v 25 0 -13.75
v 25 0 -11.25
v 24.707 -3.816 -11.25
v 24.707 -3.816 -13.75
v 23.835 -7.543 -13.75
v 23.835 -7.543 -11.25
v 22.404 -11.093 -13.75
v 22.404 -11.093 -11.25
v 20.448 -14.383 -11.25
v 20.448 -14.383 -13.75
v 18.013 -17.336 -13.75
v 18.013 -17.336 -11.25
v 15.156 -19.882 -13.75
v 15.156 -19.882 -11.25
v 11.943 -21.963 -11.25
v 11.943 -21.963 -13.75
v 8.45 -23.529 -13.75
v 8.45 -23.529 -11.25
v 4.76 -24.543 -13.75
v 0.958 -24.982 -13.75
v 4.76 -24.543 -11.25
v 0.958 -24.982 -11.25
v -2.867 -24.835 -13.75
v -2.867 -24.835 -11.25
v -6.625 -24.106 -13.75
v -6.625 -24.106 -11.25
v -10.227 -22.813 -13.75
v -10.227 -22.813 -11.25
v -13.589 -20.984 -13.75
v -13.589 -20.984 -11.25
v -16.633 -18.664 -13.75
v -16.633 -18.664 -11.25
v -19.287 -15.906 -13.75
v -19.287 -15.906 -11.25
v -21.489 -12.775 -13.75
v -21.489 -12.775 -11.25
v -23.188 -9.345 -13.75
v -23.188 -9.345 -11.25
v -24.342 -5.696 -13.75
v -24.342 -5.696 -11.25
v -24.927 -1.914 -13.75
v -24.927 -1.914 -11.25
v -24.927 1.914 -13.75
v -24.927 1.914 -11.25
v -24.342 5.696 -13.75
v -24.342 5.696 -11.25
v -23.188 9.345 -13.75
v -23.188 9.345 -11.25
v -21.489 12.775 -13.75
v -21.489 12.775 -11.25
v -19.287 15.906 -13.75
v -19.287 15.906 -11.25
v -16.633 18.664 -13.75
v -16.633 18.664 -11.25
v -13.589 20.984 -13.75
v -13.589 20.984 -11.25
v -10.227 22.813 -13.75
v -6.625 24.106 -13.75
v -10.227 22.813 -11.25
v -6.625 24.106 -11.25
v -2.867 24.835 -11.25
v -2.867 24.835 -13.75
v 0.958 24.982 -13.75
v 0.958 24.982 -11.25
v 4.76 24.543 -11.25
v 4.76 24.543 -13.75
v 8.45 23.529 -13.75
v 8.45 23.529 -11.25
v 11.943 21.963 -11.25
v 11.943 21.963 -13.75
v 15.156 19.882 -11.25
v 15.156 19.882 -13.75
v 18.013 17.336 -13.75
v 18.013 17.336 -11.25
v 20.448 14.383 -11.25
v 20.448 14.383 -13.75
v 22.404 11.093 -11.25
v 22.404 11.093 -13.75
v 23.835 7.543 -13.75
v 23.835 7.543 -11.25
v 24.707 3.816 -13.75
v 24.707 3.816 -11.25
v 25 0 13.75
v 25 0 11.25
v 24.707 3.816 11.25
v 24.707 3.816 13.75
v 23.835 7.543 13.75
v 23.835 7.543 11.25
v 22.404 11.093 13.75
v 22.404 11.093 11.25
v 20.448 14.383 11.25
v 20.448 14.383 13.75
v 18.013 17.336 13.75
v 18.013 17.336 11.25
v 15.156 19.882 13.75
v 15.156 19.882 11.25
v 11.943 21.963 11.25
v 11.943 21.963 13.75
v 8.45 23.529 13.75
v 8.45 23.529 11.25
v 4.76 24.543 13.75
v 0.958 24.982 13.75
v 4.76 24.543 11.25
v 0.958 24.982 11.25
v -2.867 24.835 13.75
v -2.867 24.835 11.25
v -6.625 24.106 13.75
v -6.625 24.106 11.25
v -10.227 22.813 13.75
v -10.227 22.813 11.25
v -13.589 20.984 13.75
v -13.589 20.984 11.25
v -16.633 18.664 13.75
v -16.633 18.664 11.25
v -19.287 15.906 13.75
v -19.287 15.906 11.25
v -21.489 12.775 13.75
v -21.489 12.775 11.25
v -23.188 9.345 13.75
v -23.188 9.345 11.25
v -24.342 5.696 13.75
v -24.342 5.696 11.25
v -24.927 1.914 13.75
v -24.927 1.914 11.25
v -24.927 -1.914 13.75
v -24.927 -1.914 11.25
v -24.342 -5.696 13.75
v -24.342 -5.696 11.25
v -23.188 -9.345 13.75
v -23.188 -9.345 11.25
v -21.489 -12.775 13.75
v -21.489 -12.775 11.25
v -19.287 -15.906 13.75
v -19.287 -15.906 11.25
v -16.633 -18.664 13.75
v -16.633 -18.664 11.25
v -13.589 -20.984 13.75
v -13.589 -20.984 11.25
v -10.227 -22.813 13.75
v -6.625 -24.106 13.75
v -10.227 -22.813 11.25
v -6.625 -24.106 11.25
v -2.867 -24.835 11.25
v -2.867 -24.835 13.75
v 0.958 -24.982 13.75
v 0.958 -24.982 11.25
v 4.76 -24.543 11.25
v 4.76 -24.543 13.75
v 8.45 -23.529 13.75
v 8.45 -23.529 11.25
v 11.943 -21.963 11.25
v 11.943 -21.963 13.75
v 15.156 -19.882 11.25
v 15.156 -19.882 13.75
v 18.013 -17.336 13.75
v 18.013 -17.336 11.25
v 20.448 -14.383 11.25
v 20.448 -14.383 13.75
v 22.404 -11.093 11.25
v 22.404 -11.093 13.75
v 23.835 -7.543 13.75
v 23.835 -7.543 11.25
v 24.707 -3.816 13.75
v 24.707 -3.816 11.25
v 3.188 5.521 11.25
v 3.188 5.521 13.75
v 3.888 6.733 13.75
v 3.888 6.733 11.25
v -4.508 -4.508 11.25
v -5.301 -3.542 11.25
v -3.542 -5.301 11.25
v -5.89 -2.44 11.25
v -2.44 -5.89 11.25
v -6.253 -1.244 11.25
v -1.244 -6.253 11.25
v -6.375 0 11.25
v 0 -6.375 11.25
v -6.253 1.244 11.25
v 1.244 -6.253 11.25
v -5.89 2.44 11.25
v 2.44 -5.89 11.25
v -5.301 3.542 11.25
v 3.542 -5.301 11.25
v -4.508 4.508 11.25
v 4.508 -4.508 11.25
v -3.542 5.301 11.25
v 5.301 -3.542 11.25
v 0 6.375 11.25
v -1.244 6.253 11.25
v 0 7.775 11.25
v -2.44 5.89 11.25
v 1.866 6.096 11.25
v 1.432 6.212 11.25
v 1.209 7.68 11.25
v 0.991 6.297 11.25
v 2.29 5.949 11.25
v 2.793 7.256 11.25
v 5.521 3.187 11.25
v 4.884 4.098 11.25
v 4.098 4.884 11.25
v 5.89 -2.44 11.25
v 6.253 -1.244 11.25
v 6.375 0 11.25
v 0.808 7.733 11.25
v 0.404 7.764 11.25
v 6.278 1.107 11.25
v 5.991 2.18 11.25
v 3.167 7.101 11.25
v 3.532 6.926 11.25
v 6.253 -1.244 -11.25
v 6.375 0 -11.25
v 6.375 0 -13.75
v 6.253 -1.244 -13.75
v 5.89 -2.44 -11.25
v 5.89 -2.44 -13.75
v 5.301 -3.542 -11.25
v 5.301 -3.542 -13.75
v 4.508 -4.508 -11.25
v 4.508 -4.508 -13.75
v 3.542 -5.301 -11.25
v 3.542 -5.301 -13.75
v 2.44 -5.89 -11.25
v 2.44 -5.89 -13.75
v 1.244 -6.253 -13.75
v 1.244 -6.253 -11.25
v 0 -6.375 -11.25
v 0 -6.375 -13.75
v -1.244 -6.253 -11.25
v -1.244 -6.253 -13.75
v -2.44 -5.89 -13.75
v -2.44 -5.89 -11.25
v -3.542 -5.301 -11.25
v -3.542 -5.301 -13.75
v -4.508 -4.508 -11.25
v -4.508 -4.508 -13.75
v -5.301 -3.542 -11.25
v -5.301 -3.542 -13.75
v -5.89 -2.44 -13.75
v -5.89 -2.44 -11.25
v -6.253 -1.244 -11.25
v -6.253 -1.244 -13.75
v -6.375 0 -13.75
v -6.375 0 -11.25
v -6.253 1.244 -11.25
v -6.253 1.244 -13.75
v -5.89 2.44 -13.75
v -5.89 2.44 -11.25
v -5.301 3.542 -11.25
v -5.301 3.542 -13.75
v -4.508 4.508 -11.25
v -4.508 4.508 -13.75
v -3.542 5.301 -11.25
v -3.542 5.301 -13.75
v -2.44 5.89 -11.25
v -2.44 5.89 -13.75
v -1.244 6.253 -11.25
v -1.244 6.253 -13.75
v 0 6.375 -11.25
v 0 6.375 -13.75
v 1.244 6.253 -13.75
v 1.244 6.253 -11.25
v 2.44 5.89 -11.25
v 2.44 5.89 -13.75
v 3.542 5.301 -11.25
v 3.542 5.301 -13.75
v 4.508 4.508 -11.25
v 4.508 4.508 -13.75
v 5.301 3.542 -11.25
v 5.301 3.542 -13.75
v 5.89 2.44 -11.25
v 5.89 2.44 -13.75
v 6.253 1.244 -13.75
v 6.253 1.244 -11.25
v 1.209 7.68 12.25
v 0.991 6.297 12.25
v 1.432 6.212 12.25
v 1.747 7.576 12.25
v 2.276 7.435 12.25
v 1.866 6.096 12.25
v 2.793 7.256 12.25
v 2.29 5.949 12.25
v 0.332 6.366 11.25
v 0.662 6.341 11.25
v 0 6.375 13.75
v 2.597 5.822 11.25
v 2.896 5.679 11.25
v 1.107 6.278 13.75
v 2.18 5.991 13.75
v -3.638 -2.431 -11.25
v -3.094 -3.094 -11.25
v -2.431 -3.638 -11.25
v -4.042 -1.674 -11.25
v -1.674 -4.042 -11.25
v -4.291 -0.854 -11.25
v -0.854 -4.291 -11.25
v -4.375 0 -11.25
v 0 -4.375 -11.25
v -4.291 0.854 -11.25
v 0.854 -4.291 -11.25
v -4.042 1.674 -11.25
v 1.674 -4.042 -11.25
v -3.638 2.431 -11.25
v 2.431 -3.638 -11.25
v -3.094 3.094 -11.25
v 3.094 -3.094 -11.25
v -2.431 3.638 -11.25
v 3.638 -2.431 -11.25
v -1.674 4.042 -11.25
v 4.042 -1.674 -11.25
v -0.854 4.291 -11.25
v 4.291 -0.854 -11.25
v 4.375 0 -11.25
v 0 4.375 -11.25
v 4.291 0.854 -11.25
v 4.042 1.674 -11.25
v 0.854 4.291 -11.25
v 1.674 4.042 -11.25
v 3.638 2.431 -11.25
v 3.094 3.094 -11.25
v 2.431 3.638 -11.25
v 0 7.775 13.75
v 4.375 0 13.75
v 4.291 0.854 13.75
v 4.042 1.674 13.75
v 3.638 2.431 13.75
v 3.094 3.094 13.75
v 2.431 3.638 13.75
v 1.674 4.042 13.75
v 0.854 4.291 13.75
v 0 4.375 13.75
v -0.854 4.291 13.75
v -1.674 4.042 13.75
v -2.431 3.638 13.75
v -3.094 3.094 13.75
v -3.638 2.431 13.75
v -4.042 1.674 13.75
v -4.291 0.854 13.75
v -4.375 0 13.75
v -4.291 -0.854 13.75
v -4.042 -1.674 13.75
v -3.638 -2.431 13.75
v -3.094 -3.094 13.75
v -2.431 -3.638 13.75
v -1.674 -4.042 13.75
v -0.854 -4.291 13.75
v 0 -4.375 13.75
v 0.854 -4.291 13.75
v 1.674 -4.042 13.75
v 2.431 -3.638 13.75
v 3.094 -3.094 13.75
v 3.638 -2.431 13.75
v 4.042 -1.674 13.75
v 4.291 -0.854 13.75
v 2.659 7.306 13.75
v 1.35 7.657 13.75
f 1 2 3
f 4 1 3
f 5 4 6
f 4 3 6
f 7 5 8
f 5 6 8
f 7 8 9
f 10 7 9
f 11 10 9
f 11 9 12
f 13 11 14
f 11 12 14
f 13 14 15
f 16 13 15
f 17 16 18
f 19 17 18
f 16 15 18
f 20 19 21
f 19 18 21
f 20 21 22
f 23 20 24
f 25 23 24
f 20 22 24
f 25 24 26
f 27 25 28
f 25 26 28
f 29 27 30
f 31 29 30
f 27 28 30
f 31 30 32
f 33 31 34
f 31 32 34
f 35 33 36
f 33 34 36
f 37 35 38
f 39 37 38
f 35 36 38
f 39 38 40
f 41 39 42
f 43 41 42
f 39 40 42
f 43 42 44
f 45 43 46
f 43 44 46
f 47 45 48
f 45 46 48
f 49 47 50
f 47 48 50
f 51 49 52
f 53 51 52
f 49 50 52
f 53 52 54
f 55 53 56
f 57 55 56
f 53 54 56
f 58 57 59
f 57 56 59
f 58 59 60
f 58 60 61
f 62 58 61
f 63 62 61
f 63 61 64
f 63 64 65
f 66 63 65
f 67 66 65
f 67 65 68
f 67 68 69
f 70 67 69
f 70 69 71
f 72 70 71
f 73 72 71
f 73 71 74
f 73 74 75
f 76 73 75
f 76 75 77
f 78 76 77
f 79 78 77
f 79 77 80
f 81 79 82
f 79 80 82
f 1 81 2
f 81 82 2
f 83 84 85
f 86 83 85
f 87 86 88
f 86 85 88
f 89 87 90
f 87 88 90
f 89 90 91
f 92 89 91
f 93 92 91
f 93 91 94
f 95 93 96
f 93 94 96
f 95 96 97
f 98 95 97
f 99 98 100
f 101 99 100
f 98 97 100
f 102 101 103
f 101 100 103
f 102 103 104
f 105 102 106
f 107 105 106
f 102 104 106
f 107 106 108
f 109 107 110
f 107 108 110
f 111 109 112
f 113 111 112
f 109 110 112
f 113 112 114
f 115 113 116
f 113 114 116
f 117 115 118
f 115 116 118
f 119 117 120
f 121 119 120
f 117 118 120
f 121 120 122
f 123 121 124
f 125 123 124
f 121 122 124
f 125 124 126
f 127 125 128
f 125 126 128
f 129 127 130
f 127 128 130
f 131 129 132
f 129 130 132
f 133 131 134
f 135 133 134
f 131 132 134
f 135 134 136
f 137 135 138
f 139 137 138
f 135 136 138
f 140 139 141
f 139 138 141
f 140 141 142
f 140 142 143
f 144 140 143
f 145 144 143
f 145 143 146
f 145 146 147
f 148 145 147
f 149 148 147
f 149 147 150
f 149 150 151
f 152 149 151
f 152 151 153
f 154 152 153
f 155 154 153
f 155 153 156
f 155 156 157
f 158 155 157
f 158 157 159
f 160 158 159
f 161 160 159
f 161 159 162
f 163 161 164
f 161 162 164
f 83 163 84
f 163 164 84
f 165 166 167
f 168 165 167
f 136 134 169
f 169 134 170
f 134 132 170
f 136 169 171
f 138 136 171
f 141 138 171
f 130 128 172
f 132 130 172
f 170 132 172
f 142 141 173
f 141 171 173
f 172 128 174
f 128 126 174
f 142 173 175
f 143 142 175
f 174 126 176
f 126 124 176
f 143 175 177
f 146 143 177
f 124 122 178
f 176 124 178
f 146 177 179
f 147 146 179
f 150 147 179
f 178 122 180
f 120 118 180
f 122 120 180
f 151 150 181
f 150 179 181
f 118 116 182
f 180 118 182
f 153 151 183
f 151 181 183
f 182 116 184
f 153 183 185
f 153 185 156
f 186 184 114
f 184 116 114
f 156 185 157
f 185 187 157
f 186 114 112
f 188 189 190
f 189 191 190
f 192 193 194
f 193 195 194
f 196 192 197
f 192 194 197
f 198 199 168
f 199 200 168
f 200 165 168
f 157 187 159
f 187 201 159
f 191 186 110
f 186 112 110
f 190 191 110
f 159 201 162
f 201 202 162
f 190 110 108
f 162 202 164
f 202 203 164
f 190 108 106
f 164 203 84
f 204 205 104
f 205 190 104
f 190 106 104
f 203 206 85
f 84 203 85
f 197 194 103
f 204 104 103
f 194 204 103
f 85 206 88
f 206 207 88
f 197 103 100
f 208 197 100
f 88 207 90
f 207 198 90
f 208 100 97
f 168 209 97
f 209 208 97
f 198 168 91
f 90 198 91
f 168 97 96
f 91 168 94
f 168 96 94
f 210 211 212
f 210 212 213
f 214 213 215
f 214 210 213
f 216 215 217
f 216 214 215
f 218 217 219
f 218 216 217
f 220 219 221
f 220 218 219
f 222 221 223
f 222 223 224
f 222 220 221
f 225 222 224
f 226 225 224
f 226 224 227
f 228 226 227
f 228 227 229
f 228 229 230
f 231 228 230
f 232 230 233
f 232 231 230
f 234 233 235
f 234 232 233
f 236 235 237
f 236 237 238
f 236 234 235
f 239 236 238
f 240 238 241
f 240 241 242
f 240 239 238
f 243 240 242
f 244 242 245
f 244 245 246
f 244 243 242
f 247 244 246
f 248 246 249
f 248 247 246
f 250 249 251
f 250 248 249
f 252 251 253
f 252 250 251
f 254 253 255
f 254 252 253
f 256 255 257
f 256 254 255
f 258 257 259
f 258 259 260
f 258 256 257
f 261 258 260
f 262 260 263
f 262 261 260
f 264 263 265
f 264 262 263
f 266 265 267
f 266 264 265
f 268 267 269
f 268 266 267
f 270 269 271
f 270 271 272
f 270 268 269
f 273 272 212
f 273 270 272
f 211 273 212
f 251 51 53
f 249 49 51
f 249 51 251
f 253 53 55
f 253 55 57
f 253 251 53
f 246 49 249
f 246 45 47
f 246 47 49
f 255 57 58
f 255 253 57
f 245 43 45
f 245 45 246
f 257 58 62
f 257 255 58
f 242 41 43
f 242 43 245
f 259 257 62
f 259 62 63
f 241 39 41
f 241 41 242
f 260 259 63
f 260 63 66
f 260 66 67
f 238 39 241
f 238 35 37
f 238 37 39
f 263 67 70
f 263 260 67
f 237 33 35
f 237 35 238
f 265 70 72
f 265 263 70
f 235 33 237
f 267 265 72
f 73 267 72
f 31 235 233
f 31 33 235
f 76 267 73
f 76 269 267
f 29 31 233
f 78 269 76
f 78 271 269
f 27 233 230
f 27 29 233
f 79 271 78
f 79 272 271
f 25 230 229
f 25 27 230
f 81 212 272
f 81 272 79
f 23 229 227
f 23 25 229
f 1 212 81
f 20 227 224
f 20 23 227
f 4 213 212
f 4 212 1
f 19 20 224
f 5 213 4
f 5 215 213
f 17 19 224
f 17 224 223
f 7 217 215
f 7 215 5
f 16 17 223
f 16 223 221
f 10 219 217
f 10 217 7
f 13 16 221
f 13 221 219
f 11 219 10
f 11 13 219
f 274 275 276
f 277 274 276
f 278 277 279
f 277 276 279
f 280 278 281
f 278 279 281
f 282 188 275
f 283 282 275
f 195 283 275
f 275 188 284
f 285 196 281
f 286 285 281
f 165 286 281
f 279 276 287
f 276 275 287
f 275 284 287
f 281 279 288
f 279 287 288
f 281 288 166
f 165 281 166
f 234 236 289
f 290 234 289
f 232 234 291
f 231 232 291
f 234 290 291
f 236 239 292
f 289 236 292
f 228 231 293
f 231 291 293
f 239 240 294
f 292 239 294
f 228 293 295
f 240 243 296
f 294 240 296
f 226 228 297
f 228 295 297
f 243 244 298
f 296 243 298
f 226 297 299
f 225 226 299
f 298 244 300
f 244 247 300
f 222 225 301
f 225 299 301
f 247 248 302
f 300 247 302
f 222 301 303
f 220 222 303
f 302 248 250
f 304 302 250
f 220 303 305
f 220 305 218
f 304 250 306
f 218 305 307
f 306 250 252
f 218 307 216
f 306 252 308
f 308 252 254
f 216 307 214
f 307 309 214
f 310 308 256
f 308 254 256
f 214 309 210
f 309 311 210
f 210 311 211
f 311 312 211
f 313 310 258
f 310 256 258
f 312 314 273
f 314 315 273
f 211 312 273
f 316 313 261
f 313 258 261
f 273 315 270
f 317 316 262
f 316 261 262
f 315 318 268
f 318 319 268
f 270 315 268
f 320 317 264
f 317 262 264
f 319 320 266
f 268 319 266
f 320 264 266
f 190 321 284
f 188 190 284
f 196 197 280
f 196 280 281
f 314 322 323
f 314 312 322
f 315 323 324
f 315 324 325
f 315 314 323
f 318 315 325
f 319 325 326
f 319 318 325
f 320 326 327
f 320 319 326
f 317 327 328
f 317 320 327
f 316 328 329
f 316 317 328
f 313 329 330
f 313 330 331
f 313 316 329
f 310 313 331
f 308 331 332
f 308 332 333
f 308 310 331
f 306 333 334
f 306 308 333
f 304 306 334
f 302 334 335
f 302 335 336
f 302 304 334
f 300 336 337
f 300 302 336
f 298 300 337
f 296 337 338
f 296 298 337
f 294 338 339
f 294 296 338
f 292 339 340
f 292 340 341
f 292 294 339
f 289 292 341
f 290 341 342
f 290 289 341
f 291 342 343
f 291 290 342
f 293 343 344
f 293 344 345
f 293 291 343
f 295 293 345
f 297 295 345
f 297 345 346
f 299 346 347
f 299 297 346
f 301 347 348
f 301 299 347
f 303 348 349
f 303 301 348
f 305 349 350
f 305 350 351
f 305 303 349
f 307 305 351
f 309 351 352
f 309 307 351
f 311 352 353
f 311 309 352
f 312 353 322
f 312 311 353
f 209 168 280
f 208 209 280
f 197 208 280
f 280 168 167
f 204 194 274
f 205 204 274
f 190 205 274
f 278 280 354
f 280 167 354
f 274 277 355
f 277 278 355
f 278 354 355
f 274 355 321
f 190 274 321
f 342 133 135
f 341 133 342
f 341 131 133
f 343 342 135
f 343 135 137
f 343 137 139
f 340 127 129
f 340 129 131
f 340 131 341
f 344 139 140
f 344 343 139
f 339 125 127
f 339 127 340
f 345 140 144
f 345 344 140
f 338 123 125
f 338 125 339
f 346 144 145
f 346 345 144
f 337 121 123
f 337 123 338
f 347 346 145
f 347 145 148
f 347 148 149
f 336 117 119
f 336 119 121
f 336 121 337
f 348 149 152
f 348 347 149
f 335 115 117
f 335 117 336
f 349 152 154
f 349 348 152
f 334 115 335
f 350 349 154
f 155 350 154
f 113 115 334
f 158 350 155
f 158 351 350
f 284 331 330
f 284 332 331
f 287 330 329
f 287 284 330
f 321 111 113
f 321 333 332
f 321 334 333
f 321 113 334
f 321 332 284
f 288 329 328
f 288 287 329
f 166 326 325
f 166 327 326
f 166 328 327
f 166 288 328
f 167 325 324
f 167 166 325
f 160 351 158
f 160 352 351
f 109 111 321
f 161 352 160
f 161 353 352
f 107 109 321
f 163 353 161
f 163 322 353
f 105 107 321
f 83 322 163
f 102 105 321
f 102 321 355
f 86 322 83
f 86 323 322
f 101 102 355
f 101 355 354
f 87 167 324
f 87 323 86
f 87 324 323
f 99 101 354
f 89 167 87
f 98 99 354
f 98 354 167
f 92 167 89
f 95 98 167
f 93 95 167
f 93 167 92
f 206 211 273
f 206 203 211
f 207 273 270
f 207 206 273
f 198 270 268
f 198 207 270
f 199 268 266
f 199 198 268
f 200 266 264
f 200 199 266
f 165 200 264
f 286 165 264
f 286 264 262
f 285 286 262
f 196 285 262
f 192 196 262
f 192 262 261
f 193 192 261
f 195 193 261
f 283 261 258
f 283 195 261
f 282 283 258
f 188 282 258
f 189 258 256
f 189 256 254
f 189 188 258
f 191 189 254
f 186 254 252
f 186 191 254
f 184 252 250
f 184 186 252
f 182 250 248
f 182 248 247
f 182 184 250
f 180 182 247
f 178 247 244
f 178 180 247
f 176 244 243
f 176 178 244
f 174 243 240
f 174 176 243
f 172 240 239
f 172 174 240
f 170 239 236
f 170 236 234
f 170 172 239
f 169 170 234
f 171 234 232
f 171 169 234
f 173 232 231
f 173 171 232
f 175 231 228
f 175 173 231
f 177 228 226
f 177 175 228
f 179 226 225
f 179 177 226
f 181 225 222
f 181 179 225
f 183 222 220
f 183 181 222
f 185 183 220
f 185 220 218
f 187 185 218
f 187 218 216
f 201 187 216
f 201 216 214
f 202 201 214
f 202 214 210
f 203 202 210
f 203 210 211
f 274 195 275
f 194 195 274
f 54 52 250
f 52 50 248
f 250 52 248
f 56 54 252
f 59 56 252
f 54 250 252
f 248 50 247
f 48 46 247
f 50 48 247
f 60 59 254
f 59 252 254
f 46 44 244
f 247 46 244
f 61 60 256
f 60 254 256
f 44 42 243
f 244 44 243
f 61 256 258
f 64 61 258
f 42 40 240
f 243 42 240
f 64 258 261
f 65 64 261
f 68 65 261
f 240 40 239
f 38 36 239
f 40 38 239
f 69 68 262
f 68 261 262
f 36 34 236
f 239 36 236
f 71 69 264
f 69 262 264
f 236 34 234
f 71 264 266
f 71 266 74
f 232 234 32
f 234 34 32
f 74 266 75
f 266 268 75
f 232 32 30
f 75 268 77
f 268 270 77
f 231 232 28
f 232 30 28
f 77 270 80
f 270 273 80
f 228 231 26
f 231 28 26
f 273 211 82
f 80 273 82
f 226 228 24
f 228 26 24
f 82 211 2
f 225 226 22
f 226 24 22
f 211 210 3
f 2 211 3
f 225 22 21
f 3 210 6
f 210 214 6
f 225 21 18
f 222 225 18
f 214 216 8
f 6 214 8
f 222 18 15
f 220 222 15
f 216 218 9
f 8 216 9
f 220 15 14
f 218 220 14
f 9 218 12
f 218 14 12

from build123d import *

# Parameters (mm, degrees)
F0_R     = 6.375
F0_R_2   = 4.375
F1_DEPTH = 11.25
F2_R     = 25
F2_R_2   = 6.375
F2_R_3   = 4.375
F3_DEPTH = 2.5
F6_DEPTH = 2.5
F8_DEPTH = 1
F4_R     = 25
F4_R_2   = 6.375
F9_DEPTH = 2.5


with BuildPart() as f1:
    # F0 (on Top) → F1 (new body, symmetric)
    with BuildSketch(Plane.XY):
        Circle(F0_R)
        Circle(F0_R_2, mode=Mode.SUBTRACT)
    extrude(amount=F1_DEPTH, both=True)

    # F2 (on face) → F3 (join)
    with BuildSketch(Plane.XY.offset(11.25)):
        Circle(F2_R)
        Circle(F2_R_2, mode=Mode.SUBTRACT)
        Circle(F2_R_2)
        Circle(F2_R_3, mode=Mode.SUBTRACT)
    extrude(amount=F3_DEPTH)

    # F5 (on face) → F6 (cut, through all)
    with BuildSketch(Plane.XY.offset(13.75)):
        with BuildLine():
            ThreePointArc((0, 6.375), (1.6499714125, 6.1577771426), (3.1875, 5.5209119491))
            Line((3.1875, 5.5209119491), (3.8875, 6.7333475144))
            ThreePointArc((3.8875, 6.7333475144), (2.0123180757, 7.5100732994), (0, 7.775))
            Line((0, 7.775), (0, 6.375))
        make_face()
    extrude(amount=-F6_DEPTH, mode=Mode.SUBTRACT)

    # F7 (on face) → F8 (join)
    with BuildSketch(Plane(origin=(0, 0, 11.25), x_dir=(1, 0, 0), z_dir=(0, 0, -1))):
        with BuildLine():
            Line((0.9911660777, -6.2974768603), (1.2088339223, -7.6804521708))
            ThreePointArc((1.2088339223, -7.6804521708), (2.0123180757, -7.5100732994), (2.7933451998, -7.2558836536))
            Line((2.7933451998, -7.2558836536), (2.2903634275, -5.9493579797))
            ThreePointArc((2.2903634275, -5.9493579797), (1.6499714125, -6.1577771426), (0.9911660777, -6.2974768603))
        make_face()
    extrude(amount=-F8_DEPTH)


with BuildPart() as f9:
    # F4 (on face) → F9 (new body)
    with BuildSketch(Plane(origin=(0, 0, -11.25), x_dir=(1, 0, 0), z_dir=(0, 0, -1))):
        Circle(F4_R)
        Circle(F4_R_2, mode=Mode.SUBTRACT)
    extrude(amount=F9_DEPTH)


solid = Compound([f1.part, f9.part])
